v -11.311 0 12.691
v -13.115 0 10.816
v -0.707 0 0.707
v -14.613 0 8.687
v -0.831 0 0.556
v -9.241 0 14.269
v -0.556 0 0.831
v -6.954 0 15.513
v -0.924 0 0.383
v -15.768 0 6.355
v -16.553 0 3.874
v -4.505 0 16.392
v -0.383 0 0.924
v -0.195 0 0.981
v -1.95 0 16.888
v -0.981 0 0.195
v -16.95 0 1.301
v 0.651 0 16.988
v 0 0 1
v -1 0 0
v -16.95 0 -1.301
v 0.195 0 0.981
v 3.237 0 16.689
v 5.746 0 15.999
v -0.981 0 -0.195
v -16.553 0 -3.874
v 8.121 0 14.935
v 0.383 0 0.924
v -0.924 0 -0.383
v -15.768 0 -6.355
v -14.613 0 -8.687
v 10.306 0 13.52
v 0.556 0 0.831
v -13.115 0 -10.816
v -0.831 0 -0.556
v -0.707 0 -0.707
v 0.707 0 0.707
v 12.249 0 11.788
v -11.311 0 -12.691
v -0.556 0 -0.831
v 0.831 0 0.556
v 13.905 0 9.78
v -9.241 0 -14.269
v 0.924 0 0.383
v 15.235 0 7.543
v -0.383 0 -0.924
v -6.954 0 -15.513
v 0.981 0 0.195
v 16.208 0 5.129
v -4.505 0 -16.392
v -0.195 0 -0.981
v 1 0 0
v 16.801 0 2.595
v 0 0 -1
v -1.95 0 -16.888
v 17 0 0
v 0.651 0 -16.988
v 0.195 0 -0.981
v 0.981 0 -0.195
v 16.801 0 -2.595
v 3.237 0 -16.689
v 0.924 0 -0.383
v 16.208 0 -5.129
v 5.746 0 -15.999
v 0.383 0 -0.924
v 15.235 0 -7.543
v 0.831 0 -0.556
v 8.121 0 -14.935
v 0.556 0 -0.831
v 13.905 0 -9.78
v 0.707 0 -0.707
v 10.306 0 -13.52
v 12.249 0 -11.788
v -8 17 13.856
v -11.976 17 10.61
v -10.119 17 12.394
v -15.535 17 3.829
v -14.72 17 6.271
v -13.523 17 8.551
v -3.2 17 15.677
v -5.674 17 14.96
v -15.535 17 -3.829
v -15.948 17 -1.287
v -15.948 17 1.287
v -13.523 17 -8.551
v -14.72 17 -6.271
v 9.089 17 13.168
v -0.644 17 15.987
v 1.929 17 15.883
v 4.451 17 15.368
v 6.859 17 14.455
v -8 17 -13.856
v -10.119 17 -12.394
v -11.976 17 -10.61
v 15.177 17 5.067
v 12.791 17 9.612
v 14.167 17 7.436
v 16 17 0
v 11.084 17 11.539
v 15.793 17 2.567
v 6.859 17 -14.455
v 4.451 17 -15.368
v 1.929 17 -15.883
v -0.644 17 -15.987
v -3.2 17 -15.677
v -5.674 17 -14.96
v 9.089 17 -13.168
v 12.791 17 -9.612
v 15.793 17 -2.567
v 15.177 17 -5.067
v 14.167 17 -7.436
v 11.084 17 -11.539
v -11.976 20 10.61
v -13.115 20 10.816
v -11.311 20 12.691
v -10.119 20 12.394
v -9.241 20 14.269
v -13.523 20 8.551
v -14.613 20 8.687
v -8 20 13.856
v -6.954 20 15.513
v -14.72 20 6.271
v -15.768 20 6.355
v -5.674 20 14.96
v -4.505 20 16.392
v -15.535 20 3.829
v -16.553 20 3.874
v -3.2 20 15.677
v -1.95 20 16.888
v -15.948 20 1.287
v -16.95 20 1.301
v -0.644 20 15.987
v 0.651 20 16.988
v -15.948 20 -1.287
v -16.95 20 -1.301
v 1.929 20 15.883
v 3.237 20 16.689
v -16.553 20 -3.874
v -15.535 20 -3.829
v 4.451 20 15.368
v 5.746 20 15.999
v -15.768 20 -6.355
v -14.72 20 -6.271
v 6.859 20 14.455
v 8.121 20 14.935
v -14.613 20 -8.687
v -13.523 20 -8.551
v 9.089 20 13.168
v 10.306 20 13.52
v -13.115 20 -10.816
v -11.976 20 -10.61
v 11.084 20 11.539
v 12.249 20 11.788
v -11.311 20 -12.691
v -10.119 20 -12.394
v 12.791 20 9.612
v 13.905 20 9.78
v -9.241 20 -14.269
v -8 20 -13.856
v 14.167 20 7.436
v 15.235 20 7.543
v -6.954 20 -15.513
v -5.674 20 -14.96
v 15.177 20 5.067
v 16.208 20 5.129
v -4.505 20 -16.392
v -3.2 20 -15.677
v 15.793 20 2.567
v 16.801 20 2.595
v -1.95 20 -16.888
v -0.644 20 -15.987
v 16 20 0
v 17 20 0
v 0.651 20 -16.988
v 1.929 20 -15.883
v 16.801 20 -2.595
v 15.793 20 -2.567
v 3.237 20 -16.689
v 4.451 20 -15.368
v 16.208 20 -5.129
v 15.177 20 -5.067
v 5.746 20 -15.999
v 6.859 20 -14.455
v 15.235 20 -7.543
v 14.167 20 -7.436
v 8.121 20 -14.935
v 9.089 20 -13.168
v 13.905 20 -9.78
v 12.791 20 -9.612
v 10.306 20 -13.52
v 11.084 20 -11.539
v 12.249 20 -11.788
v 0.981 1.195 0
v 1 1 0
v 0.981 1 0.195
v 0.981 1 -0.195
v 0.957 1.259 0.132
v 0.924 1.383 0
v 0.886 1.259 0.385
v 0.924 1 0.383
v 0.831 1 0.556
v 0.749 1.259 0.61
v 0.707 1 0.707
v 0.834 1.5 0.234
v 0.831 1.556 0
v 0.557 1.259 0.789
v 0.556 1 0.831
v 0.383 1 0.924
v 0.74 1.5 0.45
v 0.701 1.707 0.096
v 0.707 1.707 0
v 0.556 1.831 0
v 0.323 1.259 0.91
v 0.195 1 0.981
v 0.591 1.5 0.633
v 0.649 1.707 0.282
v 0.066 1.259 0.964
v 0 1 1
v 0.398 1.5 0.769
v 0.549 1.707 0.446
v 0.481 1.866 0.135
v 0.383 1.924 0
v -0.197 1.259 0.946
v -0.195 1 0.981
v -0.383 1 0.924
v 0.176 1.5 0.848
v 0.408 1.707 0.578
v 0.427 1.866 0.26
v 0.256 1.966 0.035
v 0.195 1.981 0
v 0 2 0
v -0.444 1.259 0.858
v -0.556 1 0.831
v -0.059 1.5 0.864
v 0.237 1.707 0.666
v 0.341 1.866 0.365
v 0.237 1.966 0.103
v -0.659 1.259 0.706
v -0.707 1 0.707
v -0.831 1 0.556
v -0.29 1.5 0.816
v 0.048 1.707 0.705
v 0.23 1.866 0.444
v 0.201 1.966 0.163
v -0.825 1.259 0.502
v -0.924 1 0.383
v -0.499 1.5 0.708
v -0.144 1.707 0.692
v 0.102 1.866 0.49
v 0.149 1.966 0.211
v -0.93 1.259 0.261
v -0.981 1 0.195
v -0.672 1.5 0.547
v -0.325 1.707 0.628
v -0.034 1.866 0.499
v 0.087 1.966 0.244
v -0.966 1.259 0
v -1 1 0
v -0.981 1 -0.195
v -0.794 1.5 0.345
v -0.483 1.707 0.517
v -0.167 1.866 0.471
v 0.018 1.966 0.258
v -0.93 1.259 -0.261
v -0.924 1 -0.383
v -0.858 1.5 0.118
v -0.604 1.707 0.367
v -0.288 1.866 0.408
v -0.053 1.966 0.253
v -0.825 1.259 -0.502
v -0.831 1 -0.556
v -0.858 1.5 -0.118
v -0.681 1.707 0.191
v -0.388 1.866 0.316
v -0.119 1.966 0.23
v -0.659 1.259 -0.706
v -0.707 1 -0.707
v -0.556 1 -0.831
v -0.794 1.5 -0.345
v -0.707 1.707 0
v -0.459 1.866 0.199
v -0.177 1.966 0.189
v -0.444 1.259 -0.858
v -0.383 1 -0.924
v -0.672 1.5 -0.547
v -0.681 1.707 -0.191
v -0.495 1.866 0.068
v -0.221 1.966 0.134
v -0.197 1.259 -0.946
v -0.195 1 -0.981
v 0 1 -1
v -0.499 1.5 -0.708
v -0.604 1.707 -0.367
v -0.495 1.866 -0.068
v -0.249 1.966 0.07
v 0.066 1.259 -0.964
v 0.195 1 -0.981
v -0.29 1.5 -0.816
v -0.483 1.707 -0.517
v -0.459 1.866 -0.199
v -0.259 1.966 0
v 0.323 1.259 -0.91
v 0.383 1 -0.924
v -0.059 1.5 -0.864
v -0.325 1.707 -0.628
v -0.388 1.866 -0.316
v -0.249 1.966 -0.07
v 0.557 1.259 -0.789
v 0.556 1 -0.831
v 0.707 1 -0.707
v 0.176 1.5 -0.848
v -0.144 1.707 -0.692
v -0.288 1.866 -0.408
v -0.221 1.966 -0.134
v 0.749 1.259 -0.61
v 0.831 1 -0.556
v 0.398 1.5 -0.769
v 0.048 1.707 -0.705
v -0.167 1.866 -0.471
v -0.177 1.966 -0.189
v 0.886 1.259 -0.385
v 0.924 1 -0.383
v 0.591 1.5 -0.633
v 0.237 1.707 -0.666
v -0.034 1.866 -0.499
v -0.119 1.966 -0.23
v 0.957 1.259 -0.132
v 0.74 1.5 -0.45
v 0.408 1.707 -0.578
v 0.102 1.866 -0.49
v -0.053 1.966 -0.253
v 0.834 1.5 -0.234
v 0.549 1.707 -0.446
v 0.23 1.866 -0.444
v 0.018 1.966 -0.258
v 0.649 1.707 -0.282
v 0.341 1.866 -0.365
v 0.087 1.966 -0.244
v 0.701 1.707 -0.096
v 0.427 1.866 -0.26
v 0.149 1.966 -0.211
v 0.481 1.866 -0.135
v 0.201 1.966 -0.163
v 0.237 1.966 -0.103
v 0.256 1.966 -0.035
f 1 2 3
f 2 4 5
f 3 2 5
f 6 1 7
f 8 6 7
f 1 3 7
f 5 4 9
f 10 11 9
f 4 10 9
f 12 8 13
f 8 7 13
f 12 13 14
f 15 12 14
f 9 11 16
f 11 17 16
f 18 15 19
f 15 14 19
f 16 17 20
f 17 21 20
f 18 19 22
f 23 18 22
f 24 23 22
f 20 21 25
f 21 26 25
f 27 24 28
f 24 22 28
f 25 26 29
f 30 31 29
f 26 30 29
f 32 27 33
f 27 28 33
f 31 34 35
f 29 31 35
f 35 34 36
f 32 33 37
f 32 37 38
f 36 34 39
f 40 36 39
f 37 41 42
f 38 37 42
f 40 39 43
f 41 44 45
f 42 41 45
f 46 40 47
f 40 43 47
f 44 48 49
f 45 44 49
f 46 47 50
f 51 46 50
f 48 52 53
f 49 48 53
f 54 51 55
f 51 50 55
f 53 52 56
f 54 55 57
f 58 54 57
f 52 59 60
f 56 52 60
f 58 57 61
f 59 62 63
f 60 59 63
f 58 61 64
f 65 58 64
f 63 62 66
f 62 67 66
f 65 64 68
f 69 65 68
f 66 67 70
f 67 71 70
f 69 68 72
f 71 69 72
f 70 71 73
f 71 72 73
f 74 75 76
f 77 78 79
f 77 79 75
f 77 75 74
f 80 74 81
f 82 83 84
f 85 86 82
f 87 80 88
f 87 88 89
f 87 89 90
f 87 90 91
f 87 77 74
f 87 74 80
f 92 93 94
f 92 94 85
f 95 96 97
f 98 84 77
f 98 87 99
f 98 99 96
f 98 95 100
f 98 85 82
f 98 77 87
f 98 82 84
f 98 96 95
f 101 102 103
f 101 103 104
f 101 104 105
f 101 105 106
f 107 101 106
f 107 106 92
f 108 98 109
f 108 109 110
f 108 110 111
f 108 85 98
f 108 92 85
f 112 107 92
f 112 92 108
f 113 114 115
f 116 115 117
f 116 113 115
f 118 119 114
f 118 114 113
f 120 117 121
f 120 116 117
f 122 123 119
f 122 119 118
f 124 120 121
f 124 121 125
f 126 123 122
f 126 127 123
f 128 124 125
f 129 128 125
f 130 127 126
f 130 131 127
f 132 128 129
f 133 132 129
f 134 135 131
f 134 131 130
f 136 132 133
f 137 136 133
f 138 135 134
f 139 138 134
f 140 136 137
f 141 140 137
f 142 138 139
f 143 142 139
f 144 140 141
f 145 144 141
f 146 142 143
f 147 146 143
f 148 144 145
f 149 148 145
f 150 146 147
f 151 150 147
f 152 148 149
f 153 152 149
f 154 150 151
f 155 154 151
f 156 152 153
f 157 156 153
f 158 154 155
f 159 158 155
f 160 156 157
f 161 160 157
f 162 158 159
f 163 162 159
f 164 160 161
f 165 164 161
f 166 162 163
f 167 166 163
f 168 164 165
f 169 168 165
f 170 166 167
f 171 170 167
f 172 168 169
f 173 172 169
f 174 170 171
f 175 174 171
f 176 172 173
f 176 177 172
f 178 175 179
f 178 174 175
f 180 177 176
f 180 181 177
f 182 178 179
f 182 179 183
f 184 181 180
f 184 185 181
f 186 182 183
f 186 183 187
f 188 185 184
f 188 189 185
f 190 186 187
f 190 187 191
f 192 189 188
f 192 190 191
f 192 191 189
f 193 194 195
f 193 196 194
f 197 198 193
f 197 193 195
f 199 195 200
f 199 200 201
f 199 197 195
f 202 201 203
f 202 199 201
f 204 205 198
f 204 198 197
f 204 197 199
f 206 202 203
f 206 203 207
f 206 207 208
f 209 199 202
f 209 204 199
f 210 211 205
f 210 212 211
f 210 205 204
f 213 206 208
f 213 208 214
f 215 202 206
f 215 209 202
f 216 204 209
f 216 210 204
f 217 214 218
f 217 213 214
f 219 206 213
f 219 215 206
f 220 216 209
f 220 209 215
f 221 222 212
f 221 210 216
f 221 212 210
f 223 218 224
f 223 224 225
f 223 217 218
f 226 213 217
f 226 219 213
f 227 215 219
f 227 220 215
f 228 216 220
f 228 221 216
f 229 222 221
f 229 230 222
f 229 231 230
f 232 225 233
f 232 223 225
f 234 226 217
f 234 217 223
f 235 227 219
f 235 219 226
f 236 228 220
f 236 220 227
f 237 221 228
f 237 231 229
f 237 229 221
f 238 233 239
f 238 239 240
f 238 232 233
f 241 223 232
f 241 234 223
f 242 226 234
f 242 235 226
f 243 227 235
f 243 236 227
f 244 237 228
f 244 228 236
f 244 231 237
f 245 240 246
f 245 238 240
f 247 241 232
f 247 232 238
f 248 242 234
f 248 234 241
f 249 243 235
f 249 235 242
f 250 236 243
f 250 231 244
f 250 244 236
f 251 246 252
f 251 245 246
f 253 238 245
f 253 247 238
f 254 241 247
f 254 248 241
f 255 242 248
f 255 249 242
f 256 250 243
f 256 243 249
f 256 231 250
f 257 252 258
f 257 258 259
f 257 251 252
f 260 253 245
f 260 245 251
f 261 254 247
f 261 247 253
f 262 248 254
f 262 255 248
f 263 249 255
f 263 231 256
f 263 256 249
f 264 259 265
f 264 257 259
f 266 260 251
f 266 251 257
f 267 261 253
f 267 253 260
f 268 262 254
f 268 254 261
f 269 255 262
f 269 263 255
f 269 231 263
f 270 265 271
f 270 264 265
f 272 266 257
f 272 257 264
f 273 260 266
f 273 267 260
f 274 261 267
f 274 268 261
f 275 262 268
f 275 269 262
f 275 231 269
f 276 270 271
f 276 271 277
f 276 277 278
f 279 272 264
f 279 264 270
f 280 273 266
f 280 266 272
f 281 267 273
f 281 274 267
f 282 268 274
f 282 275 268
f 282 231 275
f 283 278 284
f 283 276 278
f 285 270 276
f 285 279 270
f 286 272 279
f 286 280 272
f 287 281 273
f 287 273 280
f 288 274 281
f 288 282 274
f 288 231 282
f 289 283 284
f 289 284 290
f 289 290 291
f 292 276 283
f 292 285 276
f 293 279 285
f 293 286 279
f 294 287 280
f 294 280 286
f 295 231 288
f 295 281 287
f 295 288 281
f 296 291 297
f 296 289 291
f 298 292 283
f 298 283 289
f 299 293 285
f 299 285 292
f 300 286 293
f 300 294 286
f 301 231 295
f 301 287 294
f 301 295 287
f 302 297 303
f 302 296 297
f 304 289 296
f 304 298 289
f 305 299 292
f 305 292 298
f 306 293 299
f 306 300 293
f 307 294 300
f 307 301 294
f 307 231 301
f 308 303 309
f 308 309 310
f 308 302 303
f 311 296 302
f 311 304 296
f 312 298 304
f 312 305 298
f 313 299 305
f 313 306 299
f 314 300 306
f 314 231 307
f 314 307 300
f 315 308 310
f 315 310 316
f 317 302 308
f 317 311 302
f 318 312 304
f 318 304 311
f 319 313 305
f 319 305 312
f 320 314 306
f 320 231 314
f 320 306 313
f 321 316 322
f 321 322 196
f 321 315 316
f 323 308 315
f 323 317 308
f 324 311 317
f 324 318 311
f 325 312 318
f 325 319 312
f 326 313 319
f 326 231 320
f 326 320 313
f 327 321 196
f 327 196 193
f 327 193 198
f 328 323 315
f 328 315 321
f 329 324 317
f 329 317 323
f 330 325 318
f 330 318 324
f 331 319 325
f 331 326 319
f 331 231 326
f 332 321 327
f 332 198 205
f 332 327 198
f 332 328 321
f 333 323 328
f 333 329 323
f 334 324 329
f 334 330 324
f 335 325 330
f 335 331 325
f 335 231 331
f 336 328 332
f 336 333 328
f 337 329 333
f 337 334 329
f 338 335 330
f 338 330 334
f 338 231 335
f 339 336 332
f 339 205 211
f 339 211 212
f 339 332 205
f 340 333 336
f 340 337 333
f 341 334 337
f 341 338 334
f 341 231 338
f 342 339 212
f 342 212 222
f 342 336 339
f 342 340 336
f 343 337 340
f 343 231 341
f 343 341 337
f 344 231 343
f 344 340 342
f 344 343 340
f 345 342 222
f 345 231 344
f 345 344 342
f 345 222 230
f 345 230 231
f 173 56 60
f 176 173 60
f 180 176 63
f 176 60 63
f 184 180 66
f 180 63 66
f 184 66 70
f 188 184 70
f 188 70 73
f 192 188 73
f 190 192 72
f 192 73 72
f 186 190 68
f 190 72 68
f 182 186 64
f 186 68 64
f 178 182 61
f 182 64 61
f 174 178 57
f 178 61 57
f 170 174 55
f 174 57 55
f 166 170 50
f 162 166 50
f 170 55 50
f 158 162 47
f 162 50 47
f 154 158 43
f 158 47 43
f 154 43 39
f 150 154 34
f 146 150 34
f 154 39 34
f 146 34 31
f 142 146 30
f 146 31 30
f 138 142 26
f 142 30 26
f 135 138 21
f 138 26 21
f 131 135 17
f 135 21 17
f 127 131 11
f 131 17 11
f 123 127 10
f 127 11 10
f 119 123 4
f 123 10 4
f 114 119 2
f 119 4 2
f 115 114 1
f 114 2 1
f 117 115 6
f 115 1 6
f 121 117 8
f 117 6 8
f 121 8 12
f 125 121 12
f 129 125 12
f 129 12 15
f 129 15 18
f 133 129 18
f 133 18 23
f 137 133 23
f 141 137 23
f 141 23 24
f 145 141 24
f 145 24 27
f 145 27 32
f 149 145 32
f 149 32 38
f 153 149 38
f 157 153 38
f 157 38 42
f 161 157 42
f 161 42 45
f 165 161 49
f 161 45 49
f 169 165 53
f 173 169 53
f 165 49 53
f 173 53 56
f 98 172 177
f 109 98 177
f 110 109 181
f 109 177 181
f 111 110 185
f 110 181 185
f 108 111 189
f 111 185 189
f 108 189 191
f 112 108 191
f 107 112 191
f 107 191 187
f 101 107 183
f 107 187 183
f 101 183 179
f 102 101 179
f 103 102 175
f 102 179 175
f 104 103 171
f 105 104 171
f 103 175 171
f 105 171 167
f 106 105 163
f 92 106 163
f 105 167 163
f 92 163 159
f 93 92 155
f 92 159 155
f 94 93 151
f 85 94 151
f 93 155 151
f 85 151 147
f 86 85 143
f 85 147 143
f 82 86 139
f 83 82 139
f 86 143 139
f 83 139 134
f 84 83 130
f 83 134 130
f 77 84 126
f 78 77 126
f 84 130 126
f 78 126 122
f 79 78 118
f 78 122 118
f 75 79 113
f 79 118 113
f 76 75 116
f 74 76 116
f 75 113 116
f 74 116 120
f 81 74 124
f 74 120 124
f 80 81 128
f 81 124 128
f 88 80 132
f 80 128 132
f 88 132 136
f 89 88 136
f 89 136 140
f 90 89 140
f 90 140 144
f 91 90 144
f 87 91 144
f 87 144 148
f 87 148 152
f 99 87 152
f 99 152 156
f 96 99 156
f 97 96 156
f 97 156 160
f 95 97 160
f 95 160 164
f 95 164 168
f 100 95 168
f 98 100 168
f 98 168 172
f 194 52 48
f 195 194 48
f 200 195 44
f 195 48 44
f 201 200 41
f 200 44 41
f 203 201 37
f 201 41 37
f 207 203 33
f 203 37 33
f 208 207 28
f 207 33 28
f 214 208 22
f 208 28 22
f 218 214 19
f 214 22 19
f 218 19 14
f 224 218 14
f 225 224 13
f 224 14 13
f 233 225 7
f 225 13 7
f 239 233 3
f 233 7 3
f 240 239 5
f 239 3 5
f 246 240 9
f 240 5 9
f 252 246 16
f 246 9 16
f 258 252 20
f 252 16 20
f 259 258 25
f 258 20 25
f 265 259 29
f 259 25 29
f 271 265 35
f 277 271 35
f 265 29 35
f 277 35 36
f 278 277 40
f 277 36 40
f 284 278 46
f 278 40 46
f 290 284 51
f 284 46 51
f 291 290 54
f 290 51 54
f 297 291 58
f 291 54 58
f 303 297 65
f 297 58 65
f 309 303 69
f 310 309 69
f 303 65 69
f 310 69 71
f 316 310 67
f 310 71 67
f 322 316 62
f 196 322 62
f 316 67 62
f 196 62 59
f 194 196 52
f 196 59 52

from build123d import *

# Parameters (mm, degrees)
SKETCH1_R           = 17
BOSS_EXTRUDE1_DEPTH = 20
SKETCH2_R           = 16
CUT_EXTRUDE1_DEPTH  = 3
SKETCH3_R           = 1
CUT_EXTRUDE2_DEPTH  = 2
FILLET1_R           = 1


with BuildPart() as part:
    # Sketch1 → Boss-Extrude1 (new body)
    with BuildSketch(Plane(origin=(0, 0, 0), x_dir=(1, 0, 0), z_dir=(0, 1, 0))):
        Circle(SKETCH1_R)
    extrude(amount=BOSS_EXTRUDE1_DEPTH)

    # Sketch2 → Cut-Extrude1 (cut)
    with BuildSketch(Plane(origin=(0, 20, 0), x_dir=(1, 0, 0), z_dir=(0, 1, 0))):
        Circle(SKETCH2_R)
    extrude(amount=-CUT_EXTRUDE1_DEPTH, mode=Mode.SUBTRACT)

    # Sketch3 → Cut-Extrude2 (cut)
    with BuildSketch(Plane.XZ):
        Circle(SKETCH3_R)
    extrude(amount=-CUT_EXTRUDE2_DEPTH, mode=Mode.SUBTRACT)

    # Fillet1
    fillet1_edges = [part.edges().sort_by_distance(p)[0] for p in [
        (-1, 2, 0),
    ]]
    fillet(fillet1_edges, radius=FILLET1_R)


solid = part.part
